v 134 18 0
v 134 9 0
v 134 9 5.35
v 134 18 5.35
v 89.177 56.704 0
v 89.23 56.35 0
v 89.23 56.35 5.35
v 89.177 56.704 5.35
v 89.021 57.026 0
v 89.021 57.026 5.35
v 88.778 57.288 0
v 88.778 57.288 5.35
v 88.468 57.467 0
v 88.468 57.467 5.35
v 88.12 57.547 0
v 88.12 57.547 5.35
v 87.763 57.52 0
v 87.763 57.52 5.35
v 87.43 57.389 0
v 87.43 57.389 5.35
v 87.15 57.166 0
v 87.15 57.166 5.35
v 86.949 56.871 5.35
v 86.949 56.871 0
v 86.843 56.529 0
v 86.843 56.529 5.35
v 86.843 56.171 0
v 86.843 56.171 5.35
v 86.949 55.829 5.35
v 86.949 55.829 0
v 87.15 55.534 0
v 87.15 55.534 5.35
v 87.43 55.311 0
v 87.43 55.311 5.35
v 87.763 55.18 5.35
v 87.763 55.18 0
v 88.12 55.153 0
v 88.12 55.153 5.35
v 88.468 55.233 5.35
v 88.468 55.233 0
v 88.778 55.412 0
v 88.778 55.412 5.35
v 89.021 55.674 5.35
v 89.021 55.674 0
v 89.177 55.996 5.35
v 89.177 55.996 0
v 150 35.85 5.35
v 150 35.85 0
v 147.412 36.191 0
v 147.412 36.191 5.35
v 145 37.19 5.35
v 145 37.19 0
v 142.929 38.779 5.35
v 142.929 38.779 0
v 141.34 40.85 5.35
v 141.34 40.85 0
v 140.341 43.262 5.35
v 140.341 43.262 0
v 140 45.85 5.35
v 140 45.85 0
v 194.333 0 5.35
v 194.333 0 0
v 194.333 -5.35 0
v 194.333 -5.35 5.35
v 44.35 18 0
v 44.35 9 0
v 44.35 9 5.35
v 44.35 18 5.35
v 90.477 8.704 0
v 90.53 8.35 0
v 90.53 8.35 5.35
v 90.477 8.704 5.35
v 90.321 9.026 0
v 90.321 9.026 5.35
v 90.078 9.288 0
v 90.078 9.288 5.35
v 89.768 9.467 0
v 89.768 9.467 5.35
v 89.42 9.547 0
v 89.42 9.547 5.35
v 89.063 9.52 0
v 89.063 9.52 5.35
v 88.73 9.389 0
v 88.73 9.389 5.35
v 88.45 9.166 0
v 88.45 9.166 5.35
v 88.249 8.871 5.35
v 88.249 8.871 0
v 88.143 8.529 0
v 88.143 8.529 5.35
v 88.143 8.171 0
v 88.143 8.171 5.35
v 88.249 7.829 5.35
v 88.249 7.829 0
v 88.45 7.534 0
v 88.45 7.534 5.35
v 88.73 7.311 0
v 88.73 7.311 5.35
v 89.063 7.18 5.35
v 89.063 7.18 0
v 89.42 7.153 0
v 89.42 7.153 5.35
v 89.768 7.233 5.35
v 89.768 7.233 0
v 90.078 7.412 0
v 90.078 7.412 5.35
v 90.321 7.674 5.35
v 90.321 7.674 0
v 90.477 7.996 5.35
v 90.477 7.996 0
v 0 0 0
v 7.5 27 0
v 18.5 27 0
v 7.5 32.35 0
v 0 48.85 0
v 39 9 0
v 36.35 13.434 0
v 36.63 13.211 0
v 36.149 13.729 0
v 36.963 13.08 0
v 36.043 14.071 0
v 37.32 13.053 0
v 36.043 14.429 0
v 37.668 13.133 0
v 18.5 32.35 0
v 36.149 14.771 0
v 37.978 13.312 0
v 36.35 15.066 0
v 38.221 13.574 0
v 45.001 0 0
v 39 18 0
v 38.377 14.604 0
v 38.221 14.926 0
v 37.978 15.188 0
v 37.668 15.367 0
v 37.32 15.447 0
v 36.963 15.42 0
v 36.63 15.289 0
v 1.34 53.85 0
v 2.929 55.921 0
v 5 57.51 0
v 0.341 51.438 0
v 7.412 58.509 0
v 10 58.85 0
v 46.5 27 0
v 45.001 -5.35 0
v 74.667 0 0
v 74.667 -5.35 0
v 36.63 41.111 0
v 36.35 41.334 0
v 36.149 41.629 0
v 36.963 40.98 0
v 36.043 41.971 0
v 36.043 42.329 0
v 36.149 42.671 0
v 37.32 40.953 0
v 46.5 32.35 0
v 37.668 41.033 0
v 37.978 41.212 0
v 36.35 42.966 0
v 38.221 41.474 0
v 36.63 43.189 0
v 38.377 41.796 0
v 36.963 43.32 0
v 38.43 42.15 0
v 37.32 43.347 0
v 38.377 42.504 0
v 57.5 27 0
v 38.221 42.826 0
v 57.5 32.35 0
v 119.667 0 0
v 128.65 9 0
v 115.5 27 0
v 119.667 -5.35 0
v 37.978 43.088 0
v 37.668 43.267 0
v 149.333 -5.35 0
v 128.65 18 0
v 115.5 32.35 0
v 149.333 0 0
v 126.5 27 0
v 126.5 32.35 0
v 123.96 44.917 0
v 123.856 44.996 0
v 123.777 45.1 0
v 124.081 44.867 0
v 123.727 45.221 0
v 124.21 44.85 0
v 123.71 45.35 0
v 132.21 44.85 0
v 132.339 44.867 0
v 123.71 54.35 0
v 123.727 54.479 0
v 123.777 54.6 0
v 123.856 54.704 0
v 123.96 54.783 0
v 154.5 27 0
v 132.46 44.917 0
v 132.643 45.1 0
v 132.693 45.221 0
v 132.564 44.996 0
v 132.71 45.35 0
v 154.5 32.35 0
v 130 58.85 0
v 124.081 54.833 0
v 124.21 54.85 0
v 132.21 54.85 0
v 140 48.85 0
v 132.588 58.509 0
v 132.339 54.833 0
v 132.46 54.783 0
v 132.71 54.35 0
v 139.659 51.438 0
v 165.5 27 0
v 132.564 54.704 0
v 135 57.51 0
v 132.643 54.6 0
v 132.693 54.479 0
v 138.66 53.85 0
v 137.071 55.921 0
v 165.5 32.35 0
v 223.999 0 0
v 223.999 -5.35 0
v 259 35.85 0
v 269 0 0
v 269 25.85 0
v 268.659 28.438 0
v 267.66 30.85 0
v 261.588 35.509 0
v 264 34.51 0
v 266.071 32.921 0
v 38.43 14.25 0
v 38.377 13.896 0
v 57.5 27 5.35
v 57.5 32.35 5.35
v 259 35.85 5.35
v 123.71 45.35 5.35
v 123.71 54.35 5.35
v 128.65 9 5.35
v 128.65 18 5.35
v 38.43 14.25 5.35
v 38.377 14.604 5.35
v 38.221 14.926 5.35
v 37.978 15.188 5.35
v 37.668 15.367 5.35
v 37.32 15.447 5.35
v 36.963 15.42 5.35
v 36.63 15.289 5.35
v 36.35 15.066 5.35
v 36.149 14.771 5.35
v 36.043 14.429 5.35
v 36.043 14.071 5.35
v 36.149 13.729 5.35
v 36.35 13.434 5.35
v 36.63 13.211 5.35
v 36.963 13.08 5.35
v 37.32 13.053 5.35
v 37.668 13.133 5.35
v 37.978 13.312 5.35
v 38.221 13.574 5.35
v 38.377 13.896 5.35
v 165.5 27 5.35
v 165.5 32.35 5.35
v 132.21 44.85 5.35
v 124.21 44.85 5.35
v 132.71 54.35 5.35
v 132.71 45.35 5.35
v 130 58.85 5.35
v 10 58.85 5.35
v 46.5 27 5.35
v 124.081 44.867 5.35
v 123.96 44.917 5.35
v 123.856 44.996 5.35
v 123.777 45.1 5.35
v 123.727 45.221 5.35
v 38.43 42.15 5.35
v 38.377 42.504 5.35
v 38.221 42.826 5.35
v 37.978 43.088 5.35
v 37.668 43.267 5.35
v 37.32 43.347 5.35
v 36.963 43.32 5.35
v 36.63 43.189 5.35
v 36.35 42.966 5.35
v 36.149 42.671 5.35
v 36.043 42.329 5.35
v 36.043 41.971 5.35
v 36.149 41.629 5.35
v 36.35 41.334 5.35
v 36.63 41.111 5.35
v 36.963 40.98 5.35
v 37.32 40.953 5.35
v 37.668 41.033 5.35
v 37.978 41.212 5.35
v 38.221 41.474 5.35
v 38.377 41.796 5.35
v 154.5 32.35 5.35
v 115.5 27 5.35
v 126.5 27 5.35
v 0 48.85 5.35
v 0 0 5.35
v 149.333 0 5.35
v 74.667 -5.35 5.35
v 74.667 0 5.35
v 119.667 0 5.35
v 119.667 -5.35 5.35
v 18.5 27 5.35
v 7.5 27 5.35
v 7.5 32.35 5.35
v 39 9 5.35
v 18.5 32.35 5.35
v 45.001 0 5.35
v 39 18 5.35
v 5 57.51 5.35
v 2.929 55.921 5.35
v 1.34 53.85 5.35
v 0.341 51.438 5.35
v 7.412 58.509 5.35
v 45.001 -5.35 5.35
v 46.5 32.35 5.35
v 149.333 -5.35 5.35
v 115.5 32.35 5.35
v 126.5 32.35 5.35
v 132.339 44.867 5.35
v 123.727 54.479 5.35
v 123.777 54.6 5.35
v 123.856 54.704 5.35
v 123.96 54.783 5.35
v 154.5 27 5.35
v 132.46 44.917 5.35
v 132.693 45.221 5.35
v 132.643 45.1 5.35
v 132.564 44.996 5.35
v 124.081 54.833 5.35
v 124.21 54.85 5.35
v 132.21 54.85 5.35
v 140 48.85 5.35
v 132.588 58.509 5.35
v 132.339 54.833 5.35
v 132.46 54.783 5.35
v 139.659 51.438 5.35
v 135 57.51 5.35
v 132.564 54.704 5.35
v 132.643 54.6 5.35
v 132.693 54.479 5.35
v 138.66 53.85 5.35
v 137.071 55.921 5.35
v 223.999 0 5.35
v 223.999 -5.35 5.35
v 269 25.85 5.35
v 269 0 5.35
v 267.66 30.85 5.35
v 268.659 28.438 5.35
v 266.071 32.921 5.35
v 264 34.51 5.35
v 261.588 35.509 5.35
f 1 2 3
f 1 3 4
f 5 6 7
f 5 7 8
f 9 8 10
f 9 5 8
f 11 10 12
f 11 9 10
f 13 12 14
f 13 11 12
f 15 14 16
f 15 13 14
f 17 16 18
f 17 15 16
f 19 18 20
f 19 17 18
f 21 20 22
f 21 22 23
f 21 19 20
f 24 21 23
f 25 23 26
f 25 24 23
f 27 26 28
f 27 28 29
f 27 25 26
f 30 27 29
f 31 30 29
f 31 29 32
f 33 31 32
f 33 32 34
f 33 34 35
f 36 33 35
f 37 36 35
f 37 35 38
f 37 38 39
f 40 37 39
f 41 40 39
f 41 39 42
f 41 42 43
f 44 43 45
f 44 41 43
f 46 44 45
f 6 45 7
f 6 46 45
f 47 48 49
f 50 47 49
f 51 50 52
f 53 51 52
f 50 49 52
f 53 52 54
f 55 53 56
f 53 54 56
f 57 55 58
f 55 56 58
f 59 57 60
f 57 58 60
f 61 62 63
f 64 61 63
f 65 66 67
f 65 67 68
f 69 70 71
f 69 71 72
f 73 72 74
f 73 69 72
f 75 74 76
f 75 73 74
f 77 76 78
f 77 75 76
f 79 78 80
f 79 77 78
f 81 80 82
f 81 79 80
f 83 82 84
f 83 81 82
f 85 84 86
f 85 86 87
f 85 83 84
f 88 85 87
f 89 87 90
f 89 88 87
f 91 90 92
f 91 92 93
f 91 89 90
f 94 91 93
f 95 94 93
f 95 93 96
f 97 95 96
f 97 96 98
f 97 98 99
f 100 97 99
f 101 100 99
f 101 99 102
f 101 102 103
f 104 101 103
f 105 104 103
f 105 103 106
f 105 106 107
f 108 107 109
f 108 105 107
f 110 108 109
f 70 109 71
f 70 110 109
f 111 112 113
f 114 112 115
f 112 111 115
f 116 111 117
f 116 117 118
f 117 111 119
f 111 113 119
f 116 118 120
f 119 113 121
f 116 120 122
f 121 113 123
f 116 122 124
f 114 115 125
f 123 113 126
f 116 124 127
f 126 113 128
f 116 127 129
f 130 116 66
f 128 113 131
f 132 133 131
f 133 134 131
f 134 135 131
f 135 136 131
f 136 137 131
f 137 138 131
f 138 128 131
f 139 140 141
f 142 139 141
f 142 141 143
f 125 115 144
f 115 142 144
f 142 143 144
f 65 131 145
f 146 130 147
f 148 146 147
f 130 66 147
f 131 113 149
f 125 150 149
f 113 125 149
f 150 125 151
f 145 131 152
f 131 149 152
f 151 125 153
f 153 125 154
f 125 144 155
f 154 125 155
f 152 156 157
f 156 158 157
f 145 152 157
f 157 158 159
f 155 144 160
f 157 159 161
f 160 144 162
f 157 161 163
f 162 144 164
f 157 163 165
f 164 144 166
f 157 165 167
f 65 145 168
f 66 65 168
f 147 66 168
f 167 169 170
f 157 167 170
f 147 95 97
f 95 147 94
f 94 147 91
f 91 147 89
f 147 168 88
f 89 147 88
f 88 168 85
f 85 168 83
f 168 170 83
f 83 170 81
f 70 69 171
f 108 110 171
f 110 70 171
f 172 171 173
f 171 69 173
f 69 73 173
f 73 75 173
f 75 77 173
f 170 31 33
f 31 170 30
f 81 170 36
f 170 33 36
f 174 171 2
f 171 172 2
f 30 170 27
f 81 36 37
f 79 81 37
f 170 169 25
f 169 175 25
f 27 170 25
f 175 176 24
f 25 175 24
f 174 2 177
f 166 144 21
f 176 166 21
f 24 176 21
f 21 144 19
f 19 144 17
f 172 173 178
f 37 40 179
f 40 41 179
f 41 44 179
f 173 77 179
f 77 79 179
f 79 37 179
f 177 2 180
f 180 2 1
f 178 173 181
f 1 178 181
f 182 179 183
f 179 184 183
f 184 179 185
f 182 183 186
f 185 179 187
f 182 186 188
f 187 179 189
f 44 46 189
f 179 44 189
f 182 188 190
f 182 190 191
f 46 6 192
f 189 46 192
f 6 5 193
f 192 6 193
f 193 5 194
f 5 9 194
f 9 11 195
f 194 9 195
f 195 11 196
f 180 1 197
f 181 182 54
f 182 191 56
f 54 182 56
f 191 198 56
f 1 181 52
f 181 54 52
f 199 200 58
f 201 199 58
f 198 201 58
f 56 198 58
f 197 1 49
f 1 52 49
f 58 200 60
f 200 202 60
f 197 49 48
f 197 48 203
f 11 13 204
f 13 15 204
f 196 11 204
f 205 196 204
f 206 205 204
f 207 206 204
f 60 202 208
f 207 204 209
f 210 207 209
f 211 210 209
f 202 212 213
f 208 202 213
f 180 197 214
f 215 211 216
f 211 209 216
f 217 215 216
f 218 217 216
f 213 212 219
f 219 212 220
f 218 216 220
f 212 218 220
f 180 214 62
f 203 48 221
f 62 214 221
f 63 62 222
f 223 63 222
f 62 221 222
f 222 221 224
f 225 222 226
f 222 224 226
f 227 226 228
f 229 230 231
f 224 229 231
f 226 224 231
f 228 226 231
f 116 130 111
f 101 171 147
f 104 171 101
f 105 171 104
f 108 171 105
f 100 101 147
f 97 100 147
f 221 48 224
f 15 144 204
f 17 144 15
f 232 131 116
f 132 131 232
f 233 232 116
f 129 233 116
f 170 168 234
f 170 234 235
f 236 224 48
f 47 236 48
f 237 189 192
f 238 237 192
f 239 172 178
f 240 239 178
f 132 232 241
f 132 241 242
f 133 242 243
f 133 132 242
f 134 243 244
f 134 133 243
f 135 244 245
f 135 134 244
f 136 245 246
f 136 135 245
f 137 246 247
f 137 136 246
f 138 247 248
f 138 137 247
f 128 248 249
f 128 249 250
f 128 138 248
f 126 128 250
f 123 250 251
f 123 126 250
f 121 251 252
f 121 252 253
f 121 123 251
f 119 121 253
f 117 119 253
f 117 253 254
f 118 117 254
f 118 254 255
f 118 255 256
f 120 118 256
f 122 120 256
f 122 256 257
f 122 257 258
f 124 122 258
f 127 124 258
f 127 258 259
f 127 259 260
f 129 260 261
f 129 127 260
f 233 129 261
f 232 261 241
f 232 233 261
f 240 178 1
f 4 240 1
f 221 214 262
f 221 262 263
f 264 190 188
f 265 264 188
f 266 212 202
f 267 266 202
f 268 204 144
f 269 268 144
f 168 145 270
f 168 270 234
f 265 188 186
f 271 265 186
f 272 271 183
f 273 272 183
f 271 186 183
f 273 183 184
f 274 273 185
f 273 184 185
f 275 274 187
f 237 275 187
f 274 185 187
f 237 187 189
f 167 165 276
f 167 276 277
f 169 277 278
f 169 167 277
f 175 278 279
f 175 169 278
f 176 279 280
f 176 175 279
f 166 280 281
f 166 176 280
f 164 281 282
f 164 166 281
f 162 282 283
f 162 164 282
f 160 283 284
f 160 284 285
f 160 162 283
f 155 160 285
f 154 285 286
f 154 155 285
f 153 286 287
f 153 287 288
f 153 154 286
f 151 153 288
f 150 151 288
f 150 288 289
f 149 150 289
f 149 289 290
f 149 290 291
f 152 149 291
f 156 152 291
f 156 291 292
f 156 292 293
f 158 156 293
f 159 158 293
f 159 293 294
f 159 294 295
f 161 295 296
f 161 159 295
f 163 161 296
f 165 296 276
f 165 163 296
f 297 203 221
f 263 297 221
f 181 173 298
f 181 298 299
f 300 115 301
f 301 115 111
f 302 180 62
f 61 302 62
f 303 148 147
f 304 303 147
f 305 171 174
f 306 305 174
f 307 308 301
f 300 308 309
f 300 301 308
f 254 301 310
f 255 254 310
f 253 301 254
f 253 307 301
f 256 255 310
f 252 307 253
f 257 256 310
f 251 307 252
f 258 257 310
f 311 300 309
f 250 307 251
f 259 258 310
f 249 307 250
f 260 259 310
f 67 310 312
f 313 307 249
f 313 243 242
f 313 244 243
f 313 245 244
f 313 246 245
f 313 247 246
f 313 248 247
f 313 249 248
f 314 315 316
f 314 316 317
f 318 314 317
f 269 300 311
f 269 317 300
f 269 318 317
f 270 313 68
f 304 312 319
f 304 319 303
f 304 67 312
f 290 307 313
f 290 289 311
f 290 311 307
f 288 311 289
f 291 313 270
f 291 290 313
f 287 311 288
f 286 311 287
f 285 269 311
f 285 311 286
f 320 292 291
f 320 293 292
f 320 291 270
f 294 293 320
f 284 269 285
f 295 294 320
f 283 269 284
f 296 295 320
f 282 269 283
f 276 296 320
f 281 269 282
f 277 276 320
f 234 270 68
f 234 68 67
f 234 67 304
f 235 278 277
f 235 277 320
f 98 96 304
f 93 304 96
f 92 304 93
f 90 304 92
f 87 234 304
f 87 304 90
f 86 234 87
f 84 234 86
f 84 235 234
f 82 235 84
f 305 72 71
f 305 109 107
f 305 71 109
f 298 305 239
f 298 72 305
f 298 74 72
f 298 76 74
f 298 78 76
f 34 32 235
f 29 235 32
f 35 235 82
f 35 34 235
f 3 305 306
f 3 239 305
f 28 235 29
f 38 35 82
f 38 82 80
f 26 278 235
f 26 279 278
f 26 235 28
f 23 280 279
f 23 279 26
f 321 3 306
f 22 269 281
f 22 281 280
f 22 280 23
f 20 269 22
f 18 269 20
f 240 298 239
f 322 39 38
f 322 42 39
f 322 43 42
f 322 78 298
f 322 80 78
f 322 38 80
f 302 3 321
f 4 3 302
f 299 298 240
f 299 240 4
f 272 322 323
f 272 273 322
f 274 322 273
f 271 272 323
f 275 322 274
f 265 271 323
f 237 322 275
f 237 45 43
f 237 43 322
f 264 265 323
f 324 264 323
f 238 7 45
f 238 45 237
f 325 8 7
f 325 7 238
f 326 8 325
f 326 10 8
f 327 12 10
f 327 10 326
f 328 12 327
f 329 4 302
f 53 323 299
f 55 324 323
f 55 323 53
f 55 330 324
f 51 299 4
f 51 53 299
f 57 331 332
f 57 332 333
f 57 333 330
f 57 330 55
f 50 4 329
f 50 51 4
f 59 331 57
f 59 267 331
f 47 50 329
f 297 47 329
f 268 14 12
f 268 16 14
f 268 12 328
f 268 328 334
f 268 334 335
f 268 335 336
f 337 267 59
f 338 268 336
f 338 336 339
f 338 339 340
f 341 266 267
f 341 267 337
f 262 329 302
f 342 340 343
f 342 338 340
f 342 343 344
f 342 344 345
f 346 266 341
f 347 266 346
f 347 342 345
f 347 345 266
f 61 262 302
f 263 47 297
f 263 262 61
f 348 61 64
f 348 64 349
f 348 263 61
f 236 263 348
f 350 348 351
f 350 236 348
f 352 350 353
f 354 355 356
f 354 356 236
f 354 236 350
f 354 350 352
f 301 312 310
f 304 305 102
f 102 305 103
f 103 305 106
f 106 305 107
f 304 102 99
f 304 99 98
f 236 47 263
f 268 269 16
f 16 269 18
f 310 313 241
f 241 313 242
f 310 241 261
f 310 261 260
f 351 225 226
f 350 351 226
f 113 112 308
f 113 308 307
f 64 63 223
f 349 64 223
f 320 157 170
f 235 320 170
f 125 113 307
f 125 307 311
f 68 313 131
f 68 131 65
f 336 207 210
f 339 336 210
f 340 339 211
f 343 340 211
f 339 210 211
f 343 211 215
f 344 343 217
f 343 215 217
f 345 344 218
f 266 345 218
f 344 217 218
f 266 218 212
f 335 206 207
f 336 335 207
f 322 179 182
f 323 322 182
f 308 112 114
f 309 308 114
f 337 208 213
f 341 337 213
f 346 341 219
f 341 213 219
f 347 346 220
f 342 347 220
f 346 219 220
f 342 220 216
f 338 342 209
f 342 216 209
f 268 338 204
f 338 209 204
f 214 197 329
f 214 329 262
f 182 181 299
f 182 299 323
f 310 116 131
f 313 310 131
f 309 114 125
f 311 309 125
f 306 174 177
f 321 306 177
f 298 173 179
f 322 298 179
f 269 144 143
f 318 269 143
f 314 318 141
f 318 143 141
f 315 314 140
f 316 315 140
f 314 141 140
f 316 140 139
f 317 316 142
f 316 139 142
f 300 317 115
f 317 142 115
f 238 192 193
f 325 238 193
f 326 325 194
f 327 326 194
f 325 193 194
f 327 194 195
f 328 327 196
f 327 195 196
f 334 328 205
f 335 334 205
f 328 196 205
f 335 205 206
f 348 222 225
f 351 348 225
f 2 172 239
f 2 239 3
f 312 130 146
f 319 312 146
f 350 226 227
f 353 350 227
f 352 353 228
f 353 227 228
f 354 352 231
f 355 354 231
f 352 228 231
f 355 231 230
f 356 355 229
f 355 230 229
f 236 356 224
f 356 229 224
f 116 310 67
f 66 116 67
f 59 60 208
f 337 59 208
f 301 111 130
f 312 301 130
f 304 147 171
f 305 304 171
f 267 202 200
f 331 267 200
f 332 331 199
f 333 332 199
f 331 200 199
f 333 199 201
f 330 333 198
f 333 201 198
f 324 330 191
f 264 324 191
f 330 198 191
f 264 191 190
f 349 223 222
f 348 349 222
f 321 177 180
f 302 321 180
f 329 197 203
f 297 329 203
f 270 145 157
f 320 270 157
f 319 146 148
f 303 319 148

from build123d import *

# Parameters (mm, degrees)
MODEL_R             = 1.2
MODEL_W             = 11
MODEL_H             = 5.35
MODEL_W_2           = 5.35
MODEL_H_2           = 9
BOSS_EXTRUDE1_DEPTH = 5.35


with BuildPart() as part:
    # Model → Boss-Extrude1 (new body)
    with BuildSketch(Plane.XY):
        with BuildLine():
            Line((0, 0), (45.001, 0))
            Line((45.001, 0), (45.001, -5.35))
            Line((45.001, -5.35), (74.667, -5.35))
            Line((74.667, -5.35), (74.667, 0))
            Line((74.667, 0), (119.667, 0))
            Line((119.667, 0), (119.667, -5.35))
            Line((119.667, -5.35), (149.333, -5.35))
            Line((149.333, -5.35), (149.333, 0))
            Line((149.333, 0), (194.333, 0))
            Line((194.333, 0), (194.333, -5.35))
            Line((194.333, -5.35), (223.999, -5.35))
            Line((223.999, -5.35), (223.999, 0))
            Line((223.999, 0), (269, 0))
            Line((269, 0), (269, 25.85))
            ThreePointArc((269, 25.85), (266.071067812, 32.921067812), (259, 35.85))
            Line((259, 35.85), (150, 35.85))
            ThreePointArc((150, 35.85), (142.928932188, 38.778932188), (140, 45.85))
            Line((140, 45.85), (140, 48.85))
            ThreePointArc((140, 48.85), (137.071067812, 55.921067812), (130, 58.85))
            Line((130, 58.85), (10, 58.85))
            ThreePointArc((10, 58.85), (2.928932188, 55.921067812), (0, 48.85))
            Line((0, 48.85), (0, 0))
        make_face()
        with Locations((37.23, 42.15)):
            Circle(MODEL_R, mode=Mode.SUBTRACT)
        with Locations((88.03, 56.35)):
            Circle(MODEL_R, mode=Mode.SUBTRACT)
        with Locations((89.33, 8.35)):
            Circle(MODEL_R, mode=Mode.SUBTRACT)
        with Locations((37.23, 14.25)):
            Circle(MODEL_R, mode=Mode.SUBTRACT)
        with Locations((13, 29.675)):
            Rectangle(MODEL_W, MODEL_H, mode=Mode.SUBTRACT)
        with Locations((52, 29.675)):
            Rectangle(MODEL_W, MODEL_H, mode=Mode.SUBTRACT)
        with Locations((121, 29.675)):
            Rectangle(MODEL_W, MODEL_H, mode=Mode.SUBTRACT)
        with Locations((160, 29.675)):
            Rectangle(MODEL_W, MODEL_H, mode=Mode.SUBTRACT)
        with Locations((41.675, 13.5)):
            Rectangle(MODEL_W_2, MODEL_H_2, mode=Mode.SUBTRACT)
        with Locations((131.325, 13.5)):
            Rectangle(MODEL_W_2, MODEL_H_2, mode=Mode.SUBTRACT)
        with BuildLine():
            Line((124.21, 54.85), (132.21, 54.85))
            ThreePointArc((132.21, 54.85), (132.563553391, 54.703553391), (132.71, 54.35))
            Line((132.71, 54.35), (132.71, 45.35))
            ThreePointArc((132.71, 45.35), (132.563553391, 44.996446609), (132.21, 44.85))
            Line((132.21, 44.85), (124.21, 44.85))
            ThreePointArc((124.21, 44.85), (123.856446609, 44.996446609), (123.71, 45.35))
            Line((123.71, 45.35), (123.71, 54.35))
            ThreePointArc((123.71, 54.35), (123.856446609, 54.703553391), (124.21, 54.85))
        make_face(mode=Mode.SUBTRACT)
    extrude(amount=BOSS_EXTRUDE1_DEPTH)


solid = part.part
